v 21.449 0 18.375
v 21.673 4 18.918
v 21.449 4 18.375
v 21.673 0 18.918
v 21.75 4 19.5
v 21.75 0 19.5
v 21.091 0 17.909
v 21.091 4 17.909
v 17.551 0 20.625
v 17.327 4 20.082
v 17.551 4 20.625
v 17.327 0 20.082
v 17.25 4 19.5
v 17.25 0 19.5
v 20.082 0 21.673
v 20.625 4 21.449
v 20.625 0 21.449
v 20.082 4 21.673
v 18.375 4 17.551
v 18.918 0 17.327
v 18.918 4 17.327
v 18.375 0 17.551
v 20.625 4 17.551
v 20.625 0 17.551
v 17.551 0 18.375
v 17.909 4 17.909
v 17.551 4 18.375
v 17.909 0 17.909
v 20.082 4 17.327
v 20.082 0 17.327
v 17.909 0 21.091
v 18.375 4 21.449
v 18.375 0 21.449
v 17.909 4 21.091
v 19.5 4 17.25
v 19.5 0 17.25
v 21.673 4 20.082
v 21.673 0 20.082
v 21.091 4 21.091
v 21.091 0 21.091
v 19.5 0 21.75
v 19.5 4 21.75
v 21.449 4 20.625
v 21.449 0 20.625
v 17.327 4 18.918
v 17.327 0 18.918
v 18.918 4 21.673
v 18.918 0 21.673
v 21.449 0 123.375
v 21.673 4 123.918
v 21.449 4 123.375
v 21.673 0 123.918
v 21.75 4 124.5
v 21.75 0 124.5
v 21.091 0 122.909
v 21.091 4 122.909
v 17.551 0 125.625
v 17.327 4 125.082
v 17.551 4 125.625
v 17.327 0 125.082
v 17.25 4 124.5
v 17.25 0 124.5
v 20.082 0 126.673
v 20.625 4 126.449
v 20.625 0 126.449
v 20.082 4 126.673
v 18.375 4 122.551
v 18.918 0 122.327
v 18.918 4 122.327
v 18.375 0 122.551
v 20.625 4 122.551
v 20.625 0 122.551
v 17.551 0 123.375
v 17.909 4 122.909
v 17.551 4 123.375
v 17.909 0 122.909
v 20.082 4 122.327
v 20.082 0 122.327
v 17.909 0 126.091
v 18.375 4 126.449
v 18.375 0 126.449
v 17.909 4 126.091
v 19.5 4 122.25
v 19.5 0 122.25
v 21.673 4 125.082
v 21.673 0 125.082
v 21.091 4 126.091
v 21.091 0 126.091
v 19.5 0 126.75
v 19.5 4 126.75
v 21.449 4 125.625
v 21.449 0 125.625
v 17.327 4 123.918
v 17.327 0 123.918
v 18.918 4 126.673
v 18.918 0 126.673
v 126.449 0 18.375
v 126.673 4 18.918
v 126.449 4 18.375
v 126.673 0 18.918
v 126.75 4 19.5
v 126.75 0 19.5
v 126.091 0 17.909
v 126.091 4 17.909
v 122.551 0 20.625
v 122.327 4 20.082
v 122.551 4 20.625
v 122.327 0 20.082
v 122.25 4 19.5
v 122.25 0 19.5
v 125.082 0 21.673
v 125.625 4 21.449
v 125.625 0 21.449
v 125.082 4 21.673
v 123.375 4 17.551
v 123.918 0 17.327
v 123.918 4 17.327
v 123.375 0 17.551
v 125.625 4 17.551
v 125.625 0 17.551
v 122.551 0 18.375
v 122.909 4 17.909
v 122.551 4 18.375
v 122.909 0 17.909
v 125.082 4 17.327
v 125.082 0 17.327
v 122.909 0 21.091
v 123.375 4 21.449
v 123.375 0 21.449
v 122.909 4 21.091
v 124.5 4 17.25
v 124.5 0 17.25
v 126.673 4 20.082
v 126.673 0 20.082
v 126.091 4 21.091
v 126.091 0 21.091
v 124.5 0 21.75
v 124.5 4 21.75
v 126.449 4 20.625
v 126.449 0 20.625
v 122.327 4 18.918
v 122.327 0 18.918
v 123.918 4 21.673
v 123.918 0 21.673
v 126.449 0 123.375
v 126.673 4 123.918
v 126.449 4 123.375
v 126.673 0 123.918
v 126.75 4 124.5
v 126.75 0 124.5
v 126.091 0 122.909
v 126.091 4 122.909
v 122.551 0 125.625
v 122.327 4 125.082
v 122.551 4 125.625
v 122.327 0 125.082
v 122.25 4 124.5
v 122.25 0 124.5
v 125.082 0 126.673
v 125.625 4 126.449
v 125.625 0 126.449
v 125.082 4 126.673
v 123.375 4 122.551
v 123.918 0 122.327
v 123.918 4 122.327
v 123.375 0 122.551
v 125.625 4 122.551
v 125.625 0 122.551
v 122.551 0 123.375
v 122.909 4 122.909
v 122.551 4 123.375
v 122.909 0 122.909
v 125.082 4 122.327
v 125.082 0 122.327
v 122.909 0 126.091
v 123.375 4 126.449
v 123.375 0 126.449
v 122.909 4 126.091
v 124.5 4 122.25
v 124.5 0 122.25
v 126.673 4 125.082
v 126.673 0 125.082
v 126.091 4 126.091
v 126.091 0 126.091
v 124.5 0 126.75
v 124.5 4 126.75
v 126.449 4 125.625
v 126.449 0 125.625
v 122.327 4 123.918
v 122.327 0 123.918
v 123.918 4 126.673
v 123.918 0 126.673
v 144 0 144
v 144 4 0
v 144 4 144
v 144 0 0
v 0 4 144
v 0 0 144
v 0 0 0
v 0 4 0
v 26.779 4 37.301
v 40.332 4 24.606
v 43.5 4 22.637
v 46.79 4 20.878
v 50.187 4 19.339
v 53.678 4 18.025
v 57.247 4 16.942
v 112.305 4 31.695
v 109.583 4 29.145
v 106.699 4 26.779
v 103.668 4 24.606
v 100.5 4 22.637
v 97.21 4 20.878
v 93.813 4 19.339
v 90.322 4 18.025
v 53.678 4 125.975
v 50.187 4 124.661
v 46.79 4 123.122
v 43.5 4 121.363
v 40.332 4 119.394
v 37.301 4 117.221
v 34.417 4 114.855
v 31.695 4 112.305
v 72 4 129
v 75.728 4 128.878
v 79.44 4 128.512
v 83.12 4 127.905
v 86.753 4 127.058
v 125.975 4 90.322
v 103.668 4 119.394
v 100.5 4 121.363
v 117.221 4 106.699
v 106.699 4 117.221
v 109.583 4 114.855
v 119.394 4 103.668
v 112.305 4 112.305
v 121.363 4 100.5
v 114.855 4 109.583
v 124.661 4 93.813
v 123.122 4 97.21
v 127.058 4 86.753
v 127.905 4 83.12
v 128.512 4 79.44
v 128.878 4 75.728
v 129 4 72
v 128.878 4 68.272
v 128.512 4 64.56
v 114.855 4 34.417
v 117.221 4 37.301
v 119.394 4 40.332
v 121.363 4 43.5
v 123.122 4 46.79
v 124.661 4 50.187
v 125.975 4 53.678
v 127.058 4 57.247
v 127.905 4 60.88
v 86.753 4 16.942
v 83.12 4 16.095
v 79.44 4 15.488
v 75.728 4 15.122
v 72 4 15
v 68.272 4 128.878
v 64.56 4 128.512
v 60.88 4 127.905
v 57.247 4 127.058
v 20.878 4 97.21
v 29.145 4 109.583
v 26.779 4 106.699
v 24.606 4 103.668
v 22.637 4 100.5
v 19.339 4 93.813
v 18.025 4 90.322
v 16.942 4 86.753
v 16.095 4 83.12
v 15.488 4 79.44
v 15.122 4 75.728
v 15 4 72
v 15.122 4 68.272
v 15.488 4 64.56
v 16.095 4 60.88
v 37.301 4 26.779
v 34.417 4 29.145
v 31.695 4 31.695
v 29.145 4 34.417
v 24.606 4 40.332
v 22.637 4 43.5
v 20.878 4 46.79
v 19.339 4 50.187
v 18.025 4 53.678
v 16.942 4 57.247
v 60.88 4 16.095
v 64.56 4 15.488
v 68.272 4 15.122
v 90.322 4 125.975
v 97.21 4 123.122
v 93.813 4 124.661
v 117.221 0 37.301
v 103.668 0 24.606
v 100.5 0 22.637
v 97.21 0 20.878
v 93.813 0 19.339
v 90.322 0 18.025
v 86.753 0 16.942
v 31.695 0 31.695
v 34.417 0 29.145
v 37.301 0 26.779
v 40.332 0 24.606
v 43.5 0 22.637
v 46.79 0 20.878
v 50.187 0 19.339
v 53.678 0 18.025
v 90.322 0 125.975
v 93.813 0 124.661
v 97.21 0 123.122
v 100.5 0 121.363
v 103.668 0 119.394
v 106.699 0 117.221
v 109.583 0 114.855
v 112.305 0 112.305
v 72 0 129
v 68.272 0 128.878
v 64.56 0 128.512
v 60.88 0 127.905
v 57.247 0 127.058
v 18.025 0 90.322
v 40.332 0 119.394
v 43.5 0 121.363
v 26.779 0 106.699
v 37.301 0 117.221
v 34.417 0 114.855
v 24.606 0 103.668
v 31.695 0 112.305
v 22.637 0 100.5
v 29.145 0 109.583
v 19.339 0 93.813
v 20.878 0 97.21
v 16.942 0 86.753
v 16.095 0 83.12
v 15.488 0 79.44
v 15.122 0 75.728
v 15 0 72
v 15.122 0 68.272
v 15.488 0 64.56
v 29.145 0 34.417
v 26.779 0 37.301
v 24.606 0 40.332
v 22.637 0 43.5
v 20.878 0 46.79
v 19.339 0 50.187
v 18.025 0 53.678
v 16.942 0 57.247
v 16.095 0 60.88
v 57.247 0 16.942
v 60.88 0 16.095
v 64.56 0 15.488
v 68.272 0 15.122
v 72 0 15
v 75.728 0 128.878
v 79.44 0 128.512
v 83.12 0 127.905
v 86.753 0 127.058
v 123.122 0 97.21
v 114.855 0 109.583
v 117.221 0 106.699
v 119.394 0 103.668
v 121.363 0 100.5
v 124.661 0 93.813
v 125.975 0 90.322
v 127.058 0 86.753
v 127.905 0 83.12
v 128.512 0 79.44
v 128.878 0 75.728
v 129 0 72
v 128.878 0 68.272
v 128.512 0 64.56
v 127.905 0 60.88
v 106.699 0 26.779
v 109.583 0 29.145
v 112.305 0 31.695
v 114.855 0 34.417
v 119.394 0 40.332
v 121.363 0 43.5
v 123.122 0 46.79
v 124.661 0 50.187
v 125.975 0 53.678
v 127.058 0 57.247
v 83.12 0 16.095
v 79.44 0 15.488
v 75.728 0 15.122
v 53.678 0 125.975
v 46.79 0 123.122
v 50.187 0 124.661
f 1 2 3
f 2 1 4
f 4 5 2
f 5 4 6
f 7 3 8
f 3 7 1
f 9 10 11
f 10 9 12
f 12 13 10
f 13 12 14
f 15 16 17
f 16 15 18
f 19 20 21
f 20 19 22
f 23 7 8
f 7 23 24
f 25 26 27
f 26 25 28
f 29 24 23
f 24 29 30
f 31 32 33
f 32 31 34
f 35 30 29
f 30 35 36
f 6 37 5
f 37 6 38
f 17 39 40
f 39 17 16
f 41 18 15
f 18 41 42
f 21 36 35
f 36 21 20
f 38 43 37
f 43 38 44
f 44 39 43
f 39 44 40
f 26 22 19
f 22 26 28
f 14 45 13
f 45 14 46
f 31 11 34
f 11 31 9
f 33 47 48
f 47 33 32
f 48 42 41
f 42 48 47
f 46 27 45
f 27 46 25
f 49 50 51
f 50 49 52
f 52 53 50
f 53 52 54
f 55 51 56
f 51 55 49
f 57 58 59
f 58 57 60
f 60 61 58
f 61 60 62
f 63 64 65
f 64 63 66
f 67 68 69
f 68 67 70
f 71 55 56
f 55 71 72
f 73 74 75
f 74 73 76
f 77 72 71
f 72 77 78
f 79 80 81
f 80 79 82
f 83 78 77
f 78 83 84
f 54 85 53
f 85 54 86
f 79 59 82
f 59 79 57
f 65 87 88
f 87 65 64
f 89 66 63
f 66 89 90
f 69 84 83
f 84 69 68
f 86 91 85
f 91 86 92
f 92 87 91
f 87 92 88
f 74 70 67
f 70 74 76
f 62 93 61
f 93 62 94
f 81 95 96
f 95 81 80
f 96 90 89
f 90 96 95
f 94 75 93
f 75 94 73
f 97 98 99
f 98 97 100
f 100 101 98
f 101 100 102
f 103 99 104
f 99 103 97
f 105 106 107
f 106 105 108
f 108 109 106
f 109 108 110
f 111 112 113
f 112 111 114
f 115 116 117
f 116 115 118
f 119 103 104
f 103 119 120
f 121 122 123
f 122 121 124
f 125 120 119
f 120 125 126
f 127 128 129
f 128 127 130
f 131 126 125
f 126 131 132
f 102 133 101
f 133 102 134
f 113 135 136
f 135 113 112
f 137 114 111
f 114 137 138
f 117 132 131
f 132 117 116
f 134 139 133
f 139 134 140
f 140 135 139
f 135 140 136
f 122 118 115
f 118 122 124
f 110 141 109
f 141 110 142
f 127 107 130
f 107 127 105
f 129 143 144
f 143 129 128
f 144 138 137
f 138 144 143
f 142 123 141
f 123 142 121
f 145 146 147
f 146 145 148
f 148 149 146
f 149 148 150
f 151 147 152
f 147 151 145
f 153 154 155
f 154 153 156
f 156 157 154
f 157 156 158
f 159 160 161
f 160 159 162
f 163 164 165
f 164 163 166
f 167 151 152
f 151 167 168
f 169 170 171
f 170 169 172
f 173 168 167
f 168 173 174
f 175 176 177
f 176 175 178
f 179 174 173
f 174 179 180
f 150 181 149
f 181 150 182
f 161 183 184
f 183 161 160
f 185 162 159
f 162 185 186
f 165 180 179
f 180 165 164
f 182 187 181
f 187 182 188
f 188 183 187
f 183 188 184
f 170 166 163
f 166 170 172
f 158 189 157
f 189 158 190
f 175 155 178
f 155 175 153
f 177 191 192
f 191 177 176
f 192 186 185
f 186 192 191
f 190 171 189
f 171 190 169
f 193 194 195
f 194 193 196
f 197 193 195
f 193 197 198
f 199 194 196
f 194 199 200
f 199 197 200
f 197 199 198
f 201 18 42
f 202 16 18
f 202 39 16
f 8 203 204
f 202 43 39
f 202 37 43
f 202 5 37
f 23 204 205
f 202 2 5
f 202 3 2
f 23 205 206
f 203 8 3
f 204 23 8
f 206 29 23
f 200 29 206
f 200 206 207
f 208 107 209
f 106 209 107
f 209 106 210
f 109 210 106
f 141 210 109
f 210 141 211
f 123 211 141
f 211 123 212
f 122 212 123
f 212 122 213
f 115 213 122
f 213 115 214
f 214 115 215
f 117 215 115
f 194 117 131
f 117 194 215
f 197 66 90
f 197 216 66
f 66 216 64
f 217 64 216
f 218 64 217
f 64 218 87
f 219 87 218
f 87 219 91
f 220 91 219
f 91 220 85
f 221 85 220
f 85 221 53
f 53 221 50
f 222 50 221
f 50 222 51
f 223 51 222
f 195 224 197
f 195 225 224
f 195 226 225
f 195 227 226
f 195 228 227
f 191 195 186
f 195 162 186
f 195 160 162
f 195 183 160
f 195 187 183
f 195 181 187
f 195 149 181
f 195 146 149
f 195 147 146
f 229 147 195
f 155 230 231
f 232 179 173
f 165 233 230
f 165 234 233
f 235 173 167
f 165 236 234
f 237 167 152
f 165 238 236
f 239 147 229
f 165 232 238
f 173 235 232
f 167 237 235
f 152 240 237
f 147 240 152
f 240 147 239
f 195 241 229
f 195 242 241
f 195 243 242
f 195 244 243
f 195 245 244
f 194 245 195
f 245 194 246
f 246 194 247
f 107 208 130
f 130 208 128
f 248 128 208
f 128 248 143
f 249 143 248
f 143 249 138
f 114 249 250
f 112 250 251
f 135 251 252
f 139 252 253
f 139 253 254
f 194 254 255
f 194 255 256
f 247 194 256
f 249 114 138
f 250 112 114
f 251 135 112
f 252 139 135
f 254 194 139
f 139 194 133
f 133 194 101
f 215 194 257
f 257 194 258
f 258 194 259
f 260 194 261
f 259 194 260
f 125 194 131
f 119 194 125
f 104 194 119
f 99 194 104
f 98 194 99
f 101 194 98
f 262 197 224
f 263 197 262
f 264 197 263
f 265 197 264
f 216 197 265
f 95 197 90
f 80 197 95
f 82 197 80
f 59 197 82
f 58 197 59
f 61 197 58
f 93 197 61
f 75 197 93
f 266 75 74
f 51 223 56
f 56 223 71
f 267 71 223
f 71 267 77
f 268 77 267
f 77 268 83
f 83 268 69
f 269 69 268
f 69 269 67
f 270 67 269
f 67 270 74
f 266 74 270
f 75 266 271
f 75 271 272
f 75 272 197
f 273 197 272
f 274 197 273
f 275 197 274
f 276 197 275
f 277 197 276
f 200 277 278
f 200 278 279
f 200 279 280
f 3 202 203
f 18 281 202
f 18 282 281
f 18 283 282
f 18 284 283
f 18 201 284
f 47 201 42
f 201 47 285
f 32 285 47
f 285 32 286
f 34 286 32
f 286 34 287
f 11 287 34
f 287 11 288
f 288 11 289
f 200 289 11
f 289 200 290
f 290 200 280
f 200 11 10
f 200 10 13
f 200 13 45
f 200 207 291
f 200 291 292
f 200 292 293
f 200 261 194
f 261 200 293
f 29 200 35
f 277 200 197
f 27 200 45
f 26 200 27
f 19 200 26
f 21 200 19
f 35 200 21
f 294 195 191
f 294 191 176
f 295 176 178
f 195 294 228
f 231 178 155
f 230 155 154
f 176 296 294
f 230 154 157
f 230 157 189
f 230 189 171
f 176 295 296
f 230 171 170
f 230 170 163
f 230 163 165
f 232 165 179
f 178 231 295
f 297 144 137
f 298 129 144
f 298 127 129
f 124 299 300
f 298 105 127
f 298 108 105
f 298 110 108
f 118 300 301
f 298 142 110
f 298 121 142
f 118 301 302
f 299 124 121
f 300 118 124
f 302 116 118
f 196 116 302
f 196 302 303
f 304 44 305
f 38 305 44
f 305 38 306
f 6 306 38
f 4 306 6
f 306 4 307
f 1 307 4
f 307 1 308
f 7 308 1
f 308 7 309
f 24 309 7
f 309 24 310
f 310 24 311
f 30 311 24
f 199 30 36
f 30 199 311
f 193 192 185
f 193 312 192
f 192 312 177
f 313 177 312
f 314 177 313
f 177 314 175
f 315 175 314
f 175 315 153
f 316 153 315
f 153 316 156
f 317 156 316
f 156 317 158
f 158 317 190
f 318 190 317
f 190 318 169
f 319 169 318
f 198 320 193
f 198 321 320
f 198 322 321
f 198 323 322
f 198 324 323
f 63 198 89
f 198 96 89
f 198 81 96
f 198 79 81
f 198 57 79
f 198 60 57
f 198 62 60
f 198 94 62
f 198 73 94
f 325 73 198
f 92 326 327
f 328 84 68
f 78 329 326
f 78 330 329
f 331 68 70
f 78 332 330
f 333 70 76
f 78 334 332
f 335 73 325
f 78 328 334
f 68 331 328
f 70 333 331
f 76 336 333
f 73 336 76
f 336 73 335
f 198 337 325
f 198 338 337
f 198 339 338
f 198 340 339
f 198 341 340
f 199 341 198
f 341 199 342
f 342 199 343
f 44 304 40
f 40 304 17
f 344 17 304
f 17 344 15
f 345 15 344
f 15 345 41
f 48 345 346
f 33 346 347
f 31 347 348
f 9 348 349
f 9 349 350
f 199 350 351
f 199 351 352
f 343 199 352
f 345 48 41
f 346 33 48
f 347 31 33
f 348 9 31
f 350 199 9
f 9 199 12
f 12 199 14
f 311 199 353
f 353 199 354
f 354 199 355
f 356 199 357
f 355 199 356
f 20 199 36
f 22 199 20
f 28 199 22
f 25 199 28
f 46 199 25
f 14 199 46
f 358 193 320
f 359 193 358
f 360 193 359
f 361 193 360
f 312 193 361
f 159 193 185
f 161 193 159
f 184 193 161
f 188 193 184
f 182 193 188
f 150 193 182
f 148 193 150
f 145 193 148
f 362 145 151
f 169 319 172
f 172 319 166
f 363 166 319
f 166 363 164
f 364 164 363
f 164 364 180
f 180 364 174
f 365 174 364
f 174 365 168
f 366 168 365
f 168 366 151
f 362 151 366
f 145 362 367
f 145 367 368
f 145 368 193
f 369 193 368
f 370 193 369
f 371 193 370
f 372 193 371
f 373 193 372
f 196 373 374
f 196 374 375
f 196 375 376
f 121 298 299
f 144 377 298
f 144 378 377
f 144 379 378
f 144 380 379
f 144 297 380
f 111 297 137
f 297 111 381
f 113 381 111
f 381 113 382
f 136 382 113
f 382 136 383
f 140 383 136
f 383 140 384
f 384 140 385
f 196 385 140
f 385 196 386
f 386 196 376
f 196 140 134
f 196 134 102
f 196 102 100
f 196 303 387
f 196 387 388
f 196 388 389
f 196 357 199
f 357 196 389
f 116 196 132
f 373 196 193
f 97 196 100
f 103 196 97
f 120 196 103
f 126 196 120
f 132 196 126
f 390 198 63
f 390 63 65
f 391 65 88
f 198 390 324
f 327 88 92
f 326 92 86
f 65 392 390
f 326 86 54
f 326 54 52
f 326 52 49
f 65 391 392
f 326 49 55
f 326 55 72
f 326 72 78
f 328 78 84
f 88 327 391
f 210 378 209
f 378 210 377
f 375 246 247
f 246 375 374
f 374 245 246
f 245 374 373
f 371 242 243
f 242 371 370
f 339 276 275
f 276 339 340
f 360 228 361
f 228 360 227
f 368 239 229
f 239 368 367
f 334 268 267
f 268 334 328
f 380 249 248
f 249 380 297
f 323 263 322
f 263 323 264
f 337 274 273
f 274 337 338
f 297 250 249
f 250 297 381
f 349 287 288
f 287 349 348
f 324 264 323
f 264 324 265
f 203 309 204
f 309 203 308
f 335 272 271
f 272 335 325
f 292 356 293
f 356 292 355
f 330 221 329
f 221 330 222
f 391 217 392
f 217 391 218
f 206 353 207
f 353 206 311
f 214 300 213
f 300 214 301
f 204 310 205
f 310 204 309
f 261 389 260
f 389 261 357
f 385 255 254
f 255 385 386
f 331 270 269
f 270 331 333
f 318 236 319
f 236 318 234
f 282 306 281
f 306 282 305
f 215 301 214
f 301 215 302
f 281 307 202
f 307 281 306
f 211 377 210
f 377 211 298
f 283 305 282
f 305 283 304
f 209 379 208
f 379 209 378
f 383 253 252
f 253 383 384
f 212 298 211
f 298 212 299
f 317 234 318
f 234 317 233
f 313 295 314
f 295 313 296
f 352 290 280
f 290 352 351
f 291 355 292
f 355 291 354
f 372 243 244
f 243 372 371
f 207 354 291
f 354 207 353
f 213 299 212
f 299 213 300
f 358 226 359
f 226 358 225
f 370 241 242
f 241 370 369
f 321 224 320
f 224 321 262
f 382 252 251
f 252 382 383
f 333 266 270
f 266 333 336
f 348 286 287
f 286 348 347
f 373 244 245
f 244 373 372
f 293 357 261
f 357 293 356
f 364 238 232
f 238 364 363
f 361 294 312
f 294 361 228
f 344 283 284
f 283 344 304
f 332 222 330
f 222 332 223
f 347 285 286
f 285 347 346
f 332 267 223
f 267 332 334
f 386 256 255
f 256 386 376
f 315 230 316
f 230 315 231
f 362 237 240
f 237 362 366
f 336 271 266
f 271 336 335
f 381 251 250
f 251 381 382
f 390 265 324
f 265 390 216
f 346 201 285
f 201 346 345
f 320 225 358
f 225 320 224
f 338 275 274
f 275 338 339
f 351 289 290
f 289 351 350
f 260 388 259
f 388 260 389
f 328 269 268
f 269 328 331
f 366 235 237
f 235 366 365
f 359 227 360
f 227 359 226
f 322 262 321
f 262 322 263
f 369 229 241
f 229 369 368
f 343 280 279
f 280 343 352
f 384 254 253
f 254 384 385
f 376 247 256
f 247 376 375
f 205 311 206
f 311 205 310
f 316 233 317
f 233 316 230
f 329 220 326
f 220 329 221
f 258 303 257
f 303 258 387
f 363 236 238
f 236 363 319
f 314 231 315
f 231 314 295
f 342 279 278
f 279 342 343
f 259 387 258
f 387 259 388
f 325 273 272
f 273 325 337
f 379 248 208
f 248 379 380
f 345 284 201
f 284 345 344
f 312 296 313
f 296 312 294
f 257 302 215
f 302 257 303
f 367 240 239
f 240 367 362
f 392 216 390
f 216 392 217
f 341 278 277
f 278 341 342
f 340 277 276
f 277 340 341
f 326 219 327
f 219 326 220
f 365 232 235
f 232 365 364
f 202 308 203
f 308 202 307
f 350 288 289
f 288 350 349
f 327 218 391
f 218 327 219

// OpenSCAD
// file: ../config/TF3D-SDC-01_dimensions.scad
// TriFusión 3D – Smart Dry Cabinet
// Modelo TF3D-SDC-01 | Sprint 3.2 | Rev A
// Unidades: mm

CABINET_W = 800;
CABINET_H = 1000;
CABINET_D = 500;
BOARD_T = 18;

INNER_W = CABINET_W - 2*BOARD_T;
INNER_H = CABINET_H - 2*BOARD_T;

BACK_W = INNER_W;
BACK_H = INNER_H;
BACK_T = BOARD_T;

// Compartimento técnico inferior
TECH_H = 160;
TECH_LID_Z = TECH_H;

// Puerta sobrepuesta
DOOR_GAP = 3;
DOOR_W = CABINET_W - 2*DOOR_GAP;
DOOR_H = CABINET_H - 2*DOOR_GAP;
DOOR_FRAME = 30;
DOOR_FRAME_D = 20;
ACRYLIC_T = 6;
EPDM_T = 4;

// Soportes de carrete
SPOOL_ROWS = 4;
SPOOLS_PER_ROW = 4;
SPOOL_CENTERS_X = [110, 300, 490, 680];
SPOOL_ROWS_Z = [270, 475, 680, 885];
SUPPORT_PAIR_GAP = 82; // separación entre soportes de una misma bobina
ROD_D = 10;
ROD_L = 120;

// Soporte impreso
SUPPORT_W = 28;
SUPPORT_H = 72;
SUPPORT_D = 92;
MOUNT_T = 8;
CRADLE_R = 7;

// Ventilador previsto
FAN_SIZE = 120;
FAN_HOLE_SPACING = 105;
FAN_HOLE_D = 4.5;

// Apariencia
MELAMINE = [0.94,0.94,0.94];
PRINTED = [0.08,0.25,0.75];
METAL = [0.12,0.12,0.12];
ACRYLIC = [0.55,0.82,1.0,0.25];
SEAL = [0.05,0.05,0.05];
// file: ../config/common.scad
include <TF3D-SDC-01_dimensions.scad>

module board(size=[100,100,18], c=MELAMINE) {
    color(c) cube(size, center=false);
}

module rod(length=ROD_L, diameter=ROD_D) {
    color([0.65,0.65,0.68])
        rotate([0,90,0])
            cylinder(h=length, d=diameter, $fn=48);
}

module rounded_box(size=[20,20,20], r=3) {
    minkowski() {
        cube([size[0]-2*r,size[1]-2*r,size[2]-2*r]);
        sphere(r=r,$fn=24);
    }
}
// main file
include <../config/common.scad>

plate=4;
border=12;

difference() {
    cube([FAN_SIZE+2*border, plate, FAN_SIZE+2*border]);

    // apertura
    translate([FAN_SIZE/2+border,-1,FAN_SIZE/2+border])
        rotate([-90,0,0])
            cylinder(h=plate+2,d=114,$fn=96);

    // patrón 105 mm
    for (x=[border+(FAN_SIZE-FAN_HOLE_SPACING)/2,
            border+(FAN_SIZE+FAN_HOLE_SPACING)/2])
      for (z=[border+(FAN_SIZE-FAN_HOLE_SPACING)/2,
              border+(FAN_SIZE+FAN_HOLE_SPACING)/2])
        translate([x,-1,z])
            rotate([-90,0,0])
                cylinder(h=plate+2,d=FAN_HOLE_D,$fn=24);
}
